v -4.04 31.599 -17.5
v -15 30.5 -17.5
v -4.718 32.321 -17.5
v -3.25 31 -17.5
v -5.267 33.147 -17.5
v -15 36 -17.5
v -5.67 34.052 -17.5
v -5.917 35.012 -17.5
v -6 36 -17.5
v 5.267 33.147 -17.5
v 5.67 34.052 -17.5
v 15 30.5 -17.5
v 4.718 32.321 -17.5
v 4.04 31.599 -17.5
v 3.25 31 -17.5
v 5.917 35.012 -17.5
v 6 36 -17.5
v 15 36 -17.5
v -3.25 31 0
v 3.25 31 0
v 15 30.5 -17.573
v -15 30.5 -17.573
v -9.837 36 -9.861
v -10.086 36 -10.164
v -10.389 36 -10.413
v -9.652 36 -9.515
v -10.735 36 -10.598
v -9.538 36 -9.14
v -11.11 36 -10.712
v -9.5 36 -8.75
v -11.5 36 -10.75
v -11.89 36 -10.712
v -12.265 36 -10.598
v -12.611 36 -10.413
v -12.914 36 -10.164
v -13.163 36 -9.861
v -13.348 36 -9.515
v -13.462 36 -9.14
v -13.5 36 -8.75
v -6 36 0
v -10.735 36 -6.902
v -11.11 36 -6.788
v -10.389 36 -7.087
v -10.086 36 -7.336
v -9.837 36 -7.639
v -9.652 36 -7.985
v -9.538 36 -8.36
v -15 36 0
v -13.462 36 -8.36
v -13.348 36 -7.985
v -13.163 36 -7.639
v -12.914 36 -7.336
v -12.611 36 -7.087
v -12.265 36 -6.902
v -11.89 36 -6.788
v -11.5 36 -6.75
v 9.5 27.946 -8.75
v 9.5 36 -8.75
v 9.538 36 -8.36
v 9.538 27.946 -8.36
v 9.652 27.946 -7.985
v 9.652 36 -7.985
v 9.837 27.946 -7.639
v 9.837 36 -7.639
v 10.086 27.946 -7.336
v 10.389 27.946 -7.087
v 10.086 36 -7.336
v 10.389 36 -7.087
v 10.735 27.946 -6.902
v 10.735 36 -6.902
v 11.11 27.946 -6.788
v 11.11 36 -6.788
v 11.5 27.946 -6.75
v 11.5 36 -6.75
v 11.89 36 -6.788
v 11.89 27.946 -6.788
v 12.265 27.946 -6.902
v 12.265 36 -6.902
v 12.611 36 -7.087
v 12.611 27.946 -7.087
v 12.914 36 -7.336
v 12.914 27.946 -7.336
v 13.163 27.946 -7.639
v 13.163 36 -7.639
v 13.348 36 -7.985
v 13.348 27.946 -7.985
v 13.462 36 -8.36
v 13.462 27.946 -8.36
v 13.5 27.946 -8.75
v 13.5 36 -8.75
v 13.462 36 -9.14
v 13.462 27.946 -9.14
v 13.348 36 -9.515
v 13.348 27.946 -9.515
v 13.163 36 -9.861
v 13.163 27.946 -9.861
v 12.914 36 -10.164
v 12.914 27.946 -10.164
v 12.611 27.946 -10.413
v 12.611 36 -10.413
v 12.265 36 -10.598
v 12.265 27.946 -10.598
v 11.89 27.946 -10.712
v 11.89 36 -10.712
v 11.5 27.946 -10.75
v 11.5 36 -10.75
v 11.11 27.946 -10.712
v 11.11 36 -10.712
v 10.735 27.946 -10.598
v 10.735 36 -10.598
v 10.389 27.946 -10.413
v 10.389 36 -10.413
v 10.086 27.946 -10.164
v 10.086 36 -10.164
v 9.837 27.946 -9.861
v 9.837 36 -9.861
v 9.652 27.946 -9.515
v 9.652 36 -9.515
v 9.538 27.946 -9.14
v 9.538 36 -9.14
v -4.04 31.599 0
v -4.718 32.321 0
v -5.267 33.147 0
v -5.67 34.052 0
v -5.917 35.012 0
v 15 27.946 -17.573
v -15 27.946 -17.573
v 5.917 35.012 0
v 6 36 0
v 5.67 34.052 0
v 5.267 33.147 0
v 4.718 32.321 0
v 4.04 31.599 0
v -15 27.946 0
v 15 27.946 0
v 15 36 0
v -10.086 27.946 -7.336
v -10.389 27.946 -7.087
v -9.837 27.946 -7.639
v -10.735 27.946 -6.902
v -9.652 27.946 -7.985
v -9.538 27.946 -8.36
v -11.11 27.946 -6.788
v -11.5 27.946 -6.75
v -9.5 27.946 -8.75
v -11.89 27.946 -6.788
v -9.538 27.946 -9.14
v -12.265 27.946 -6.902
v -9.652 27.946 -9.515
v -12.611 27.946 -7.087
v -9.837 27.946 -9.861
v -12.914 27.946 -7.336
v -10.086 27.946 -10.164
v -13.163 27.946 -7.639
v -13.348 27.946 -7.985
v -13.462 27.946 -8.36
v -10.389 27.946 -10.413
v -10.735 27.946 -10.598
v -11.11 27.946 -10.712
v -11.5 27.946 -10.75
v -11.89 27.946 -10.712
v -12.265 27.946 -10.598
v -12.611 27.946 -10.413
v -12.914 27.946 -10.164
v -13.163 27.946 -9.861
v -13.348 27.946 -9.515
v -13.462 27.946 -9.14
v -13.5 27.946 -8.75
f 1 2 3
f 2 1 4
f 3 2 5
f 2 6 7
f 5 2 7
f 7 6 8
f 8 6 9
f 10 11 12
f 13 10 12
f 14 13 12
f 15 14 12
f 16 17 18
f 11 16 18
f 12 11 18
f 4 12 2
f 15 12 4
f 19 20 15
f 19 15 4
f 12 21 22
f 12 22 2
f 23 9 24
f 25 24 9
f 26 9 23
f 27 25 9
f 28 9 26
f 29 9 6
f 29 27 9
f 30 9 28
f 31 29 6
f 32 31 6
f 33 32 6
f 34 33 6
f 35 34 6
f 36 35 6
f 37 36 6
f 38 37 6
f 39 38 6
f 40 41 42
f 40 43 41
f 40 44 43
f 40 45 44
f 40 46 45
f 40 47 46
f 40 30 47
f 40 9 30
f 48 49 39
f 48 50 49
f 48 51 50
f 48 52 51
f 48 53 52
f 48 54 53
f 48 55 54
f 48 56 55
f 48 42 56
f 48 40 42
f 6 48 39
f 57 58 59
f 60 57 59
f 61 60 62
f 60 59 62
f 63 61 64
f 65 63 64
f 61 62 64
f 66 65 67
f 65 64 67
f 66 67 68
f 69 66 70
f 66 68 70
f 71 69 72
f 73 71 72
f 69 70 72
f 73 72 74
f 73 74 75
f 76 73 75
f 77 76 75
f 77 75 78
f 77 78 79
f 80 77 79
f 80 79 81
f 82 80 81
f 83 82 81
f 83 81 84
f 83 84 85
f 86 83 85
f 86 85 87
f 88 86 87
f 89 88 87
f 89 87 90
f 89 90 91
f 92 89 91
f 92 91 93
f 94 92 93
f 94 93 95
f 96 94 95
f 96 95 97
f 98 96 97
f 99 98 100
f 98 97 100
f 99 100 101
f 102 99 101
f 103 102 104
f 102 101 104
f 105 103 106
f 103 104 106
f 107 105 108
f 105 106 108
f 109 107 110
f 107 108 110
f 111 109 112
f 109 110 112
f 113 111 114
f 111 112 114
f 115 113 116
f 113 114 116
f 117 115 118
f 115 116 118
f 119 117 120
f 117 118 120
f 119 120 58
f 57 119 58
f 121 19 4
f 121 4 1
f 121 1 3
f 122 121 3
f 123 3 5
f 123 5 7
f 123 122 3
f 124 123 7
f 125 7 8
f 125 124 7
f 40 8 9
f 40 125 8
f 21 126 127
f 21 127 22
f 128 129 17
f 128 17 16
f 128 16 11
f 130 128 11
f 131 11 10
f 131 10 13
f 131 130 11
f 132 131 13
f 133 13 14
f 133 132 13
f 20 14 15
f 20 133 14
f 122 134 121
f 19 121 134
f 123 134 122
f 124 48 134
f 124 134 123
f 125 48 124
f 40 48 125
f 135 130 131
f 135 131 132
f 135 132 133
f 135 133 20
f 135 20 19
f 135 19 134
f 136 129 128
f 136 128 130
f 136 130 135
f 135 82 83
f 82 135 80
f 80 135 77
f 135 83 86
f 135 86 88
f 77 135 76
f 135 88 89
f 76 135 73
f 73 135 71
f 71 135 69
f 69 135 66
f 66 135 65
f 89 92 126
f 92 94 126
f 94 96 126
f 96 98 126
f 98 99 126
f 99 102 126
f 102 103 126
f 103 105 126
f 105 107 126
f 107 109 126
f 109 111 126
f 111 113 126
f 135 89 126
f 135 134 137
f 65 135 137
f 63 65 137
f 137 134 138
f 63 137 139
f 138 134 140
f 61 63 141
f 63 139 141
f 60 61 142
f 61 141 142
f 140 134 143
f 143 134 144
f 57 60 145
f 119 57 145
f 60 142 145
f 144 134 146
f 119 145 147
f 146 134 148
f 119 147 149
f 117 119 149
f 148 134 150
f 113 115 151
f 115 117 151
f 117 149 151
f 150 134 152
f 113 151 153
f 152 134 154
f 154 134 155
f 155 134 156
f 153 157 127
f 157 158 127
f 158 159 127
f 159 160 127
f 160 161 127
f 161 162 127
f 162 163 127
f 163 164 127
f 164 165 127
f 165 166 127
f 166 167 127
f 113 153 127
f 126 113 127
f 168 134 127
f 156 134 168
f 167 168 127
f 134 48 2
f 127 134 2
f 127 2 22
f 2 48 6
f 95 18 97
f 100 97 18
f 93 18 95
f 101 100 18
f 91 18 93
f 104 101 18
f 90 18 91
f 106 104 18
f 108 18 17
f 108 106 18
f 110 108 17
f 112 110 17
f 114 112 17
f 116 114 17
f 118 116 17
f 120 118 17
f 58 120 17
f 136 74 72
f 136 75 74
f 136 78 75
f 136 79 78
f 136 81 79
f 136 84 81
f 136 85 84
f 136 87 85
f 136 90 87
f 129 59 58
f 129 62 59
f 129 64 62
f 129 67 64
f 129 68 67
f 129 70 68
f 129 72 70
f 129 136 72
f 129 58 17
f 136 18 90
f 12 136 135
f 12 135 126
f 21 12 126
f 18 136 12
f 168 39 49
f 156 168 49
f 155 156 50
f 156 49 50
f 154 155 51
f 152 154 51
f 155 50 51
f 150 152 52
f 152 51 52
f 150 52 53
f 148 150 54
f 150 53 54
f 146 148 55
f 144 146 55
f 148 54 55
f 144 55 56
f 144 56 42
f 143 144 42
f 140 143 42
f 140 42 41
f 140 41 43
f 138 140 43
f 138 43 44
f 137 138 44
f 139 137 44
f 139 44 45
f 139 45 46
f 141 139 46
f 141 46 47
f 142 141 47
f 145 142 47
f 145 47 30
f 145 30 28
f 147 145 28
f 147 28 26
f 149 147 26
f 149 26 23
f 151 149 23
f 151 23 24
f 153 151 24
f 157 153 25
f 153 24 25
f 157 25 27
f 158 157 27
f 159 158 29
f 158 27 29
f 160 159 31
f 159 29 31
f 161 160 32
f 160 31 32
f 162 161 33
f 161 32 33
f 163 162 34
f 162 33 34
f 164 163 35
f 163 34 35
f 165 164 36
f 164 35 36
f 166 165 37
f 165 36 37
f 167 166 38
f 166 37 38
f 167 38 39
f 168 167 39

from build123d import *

# Parameters (mm, degrees)
SKETCH_2_W               = 50
SKETCH_2_H               = 4
EXTRUDE_2_DEPTH          = 22.5
SKETCH_15_R              = 1.4
EXTRUDE_8_DEPTH          = 5
SKETCH_3_W               = 30
SKETCH_3_H               = 20
EXTRUDE_4_DEPTH          = 20
EXTRUDE_9_DEPTH          = 17.5
EXTRUDE_10_DEPTH         = 15
CUT_EXTRUDE_1_REACH      = 58.089
SKETCH_19_R              = 2.1
SKETCH_20_R              = 2
CUT_EXTRUDE_2_DEPTH      = 10
CUT_EXTRUDE_3_DEPTH      = 70.524879929
CUT_EXTRUDE_3_DEPTH_BACK = 70.524879929


with BuildPart() as part:
    # 草圖2 → 填料-伸長2 (new, symmetric)
    with BuildSketch(Plane(origin=(0, 0, 0), x_dir=(0, 0, -1), z_dir=(1, 0, 0))):
        with Locations((25, 2)):
            Rectangle(SKETCH_2_W, SKETCH_2_H)
    extrude(amount=EXTRUDE_2_DEPTH, both=True)

    # 草圖15 → 填料-伸長8 (add)
    with BuildSketch(Plane(origin=(0, 4, 0), x_dir=(1, 0, 0), z_dir=(0, 1, 0))):
        with Locations(Location((17.5, 39.2, 0), (0, 0, 90))):
            Circle(SKETCH_15_R)
        with Locations(Location((17.5, 24.2, 0), (0, 0, 90))):
            Circle(SKETCH_15_R)
    extrude(amount=EXTRUDE_8_DEPTH)

    # 草圖3 → 填料-伸長4 (add)
    with BuildSketch(Plane(origin=(0, 4, 0), x_dir=(1, 0, 0), z_dir=(0, 1, 0))):
        with Locations((0, 10)):
            Rectangle(SKETCH_3_W, SKETCH_3_H)
    extrude(amount=EXTRUDE_4_DEPTH)

    # 草圖16 → 填料-伸長9 (add)
    with BuildSketch(Plane(origin=(0, 0, 0), x_dir=(-1, 0, 0), z_dir=(0, 0, -1))):
        with BuildLine():
            Line((-15, 24), (-15, 36.000002525))
            Line((-15, 36.000002525), (-6, 36.000002525))
            ThreePointArc((-6, 36.000002525), (-5.267141914, 33.146824473), (-3.25, 31.000002525))
            Line((-3.25, 31.000002525), (3.25, 31.000002525))
            ThreePointArc((3.25, 31.000002525), (5.267141914, 33.146824473), (6, 36.000002525))
            Line((6, 36.000002525), (15, 36.000002525))
            Line((15, 36.000002525), (15, 24))
            Line((15, 24), (-15, 24))
        make_face()
    extrude(amount=EXTRUDE_9_DEPTH)

    # 草圖18 → 填料-伸長10 (add, symmetric)
    with BuildSketch(Plane(origin=(0, 0, 0), x_dir=(0, 0, -1), z_dir=(1, 0, 0))):
        Polygon((17.5, 24), (28.5, 24), (28.5, 42.748788628), (27, 42.748788628), (27, 30.5), (17.5, 30.5), align=None)
    extrude(amount=EXTRUDE_10_DEPTH, both=True)

    # 草圖19 → 除料-伸長1 (cut, up to next)
    with BuildSketch(Plane(origin=(0, 0, -28.5), x_dir=(-1, 0, 0), z_dir=(0, 0, -1)), mode=Mode.PRIVATE) as cut_extrude_1_sk1:
        with Locations((0, 36.000002505)):
            Circle(SKETCH_19_R)
    cut_extrude_1_tool1 = extrude(cut_extrude_1_sk1.sketch, amount=-CUT_EXTRUDE_1_REACH, mode=Mode.PRIVATE) & part.part
    add(cut_extrude_1_tool1.solids().sort_by_distance((0, 36.000003, -28.5))[0], mode=Mode.SUBTRACT)

    # 草圖20 → 除料-伸長2 (cut)
    with BuildSketch(Plane(origin=(0, 36.000002525, 0), x_dir=(1, 0, 0), z_dir=(0, 1, 0))):
        with Locations(Location((-11.5, 8.75, 0), (0, 0, 180))):
            Circle(SKETCH_20_R)
        with Locations(Location((11.5, 8.75, 0), (0, 0, 180))):
            Circle(SKETCH_20_R)
    extrude(amount=-CUT_EXTRUDE_2_DEPTH, mode=Mode.SUBTRACT)

    # 草圖21 → 除料-伸長3 (cut, two sides: drawn at the far end of the back side and taken through both)
    with BuildSketch(Plane(origin=(0, 0, 0), x_dir=(0, 0, -1), z_dir=(1, 0, 0)).offset(-CUT_EXTRUDE_3_DEPTH_BACK)):
        Polygon((0, 0), (0, 27.945687573), (17.572849685, 27.945687573), (17.572849685, 46.39939524), (61.461395387, 46.39939524), (61.461395387, 0), align=None)
    extrude(amount=CUT_EXTRUDE_3_DEPTH + CUT_EXTRUDE_3_DEPTH_BACK, mode=Mode.SUBTRACT)


solid = part.part
